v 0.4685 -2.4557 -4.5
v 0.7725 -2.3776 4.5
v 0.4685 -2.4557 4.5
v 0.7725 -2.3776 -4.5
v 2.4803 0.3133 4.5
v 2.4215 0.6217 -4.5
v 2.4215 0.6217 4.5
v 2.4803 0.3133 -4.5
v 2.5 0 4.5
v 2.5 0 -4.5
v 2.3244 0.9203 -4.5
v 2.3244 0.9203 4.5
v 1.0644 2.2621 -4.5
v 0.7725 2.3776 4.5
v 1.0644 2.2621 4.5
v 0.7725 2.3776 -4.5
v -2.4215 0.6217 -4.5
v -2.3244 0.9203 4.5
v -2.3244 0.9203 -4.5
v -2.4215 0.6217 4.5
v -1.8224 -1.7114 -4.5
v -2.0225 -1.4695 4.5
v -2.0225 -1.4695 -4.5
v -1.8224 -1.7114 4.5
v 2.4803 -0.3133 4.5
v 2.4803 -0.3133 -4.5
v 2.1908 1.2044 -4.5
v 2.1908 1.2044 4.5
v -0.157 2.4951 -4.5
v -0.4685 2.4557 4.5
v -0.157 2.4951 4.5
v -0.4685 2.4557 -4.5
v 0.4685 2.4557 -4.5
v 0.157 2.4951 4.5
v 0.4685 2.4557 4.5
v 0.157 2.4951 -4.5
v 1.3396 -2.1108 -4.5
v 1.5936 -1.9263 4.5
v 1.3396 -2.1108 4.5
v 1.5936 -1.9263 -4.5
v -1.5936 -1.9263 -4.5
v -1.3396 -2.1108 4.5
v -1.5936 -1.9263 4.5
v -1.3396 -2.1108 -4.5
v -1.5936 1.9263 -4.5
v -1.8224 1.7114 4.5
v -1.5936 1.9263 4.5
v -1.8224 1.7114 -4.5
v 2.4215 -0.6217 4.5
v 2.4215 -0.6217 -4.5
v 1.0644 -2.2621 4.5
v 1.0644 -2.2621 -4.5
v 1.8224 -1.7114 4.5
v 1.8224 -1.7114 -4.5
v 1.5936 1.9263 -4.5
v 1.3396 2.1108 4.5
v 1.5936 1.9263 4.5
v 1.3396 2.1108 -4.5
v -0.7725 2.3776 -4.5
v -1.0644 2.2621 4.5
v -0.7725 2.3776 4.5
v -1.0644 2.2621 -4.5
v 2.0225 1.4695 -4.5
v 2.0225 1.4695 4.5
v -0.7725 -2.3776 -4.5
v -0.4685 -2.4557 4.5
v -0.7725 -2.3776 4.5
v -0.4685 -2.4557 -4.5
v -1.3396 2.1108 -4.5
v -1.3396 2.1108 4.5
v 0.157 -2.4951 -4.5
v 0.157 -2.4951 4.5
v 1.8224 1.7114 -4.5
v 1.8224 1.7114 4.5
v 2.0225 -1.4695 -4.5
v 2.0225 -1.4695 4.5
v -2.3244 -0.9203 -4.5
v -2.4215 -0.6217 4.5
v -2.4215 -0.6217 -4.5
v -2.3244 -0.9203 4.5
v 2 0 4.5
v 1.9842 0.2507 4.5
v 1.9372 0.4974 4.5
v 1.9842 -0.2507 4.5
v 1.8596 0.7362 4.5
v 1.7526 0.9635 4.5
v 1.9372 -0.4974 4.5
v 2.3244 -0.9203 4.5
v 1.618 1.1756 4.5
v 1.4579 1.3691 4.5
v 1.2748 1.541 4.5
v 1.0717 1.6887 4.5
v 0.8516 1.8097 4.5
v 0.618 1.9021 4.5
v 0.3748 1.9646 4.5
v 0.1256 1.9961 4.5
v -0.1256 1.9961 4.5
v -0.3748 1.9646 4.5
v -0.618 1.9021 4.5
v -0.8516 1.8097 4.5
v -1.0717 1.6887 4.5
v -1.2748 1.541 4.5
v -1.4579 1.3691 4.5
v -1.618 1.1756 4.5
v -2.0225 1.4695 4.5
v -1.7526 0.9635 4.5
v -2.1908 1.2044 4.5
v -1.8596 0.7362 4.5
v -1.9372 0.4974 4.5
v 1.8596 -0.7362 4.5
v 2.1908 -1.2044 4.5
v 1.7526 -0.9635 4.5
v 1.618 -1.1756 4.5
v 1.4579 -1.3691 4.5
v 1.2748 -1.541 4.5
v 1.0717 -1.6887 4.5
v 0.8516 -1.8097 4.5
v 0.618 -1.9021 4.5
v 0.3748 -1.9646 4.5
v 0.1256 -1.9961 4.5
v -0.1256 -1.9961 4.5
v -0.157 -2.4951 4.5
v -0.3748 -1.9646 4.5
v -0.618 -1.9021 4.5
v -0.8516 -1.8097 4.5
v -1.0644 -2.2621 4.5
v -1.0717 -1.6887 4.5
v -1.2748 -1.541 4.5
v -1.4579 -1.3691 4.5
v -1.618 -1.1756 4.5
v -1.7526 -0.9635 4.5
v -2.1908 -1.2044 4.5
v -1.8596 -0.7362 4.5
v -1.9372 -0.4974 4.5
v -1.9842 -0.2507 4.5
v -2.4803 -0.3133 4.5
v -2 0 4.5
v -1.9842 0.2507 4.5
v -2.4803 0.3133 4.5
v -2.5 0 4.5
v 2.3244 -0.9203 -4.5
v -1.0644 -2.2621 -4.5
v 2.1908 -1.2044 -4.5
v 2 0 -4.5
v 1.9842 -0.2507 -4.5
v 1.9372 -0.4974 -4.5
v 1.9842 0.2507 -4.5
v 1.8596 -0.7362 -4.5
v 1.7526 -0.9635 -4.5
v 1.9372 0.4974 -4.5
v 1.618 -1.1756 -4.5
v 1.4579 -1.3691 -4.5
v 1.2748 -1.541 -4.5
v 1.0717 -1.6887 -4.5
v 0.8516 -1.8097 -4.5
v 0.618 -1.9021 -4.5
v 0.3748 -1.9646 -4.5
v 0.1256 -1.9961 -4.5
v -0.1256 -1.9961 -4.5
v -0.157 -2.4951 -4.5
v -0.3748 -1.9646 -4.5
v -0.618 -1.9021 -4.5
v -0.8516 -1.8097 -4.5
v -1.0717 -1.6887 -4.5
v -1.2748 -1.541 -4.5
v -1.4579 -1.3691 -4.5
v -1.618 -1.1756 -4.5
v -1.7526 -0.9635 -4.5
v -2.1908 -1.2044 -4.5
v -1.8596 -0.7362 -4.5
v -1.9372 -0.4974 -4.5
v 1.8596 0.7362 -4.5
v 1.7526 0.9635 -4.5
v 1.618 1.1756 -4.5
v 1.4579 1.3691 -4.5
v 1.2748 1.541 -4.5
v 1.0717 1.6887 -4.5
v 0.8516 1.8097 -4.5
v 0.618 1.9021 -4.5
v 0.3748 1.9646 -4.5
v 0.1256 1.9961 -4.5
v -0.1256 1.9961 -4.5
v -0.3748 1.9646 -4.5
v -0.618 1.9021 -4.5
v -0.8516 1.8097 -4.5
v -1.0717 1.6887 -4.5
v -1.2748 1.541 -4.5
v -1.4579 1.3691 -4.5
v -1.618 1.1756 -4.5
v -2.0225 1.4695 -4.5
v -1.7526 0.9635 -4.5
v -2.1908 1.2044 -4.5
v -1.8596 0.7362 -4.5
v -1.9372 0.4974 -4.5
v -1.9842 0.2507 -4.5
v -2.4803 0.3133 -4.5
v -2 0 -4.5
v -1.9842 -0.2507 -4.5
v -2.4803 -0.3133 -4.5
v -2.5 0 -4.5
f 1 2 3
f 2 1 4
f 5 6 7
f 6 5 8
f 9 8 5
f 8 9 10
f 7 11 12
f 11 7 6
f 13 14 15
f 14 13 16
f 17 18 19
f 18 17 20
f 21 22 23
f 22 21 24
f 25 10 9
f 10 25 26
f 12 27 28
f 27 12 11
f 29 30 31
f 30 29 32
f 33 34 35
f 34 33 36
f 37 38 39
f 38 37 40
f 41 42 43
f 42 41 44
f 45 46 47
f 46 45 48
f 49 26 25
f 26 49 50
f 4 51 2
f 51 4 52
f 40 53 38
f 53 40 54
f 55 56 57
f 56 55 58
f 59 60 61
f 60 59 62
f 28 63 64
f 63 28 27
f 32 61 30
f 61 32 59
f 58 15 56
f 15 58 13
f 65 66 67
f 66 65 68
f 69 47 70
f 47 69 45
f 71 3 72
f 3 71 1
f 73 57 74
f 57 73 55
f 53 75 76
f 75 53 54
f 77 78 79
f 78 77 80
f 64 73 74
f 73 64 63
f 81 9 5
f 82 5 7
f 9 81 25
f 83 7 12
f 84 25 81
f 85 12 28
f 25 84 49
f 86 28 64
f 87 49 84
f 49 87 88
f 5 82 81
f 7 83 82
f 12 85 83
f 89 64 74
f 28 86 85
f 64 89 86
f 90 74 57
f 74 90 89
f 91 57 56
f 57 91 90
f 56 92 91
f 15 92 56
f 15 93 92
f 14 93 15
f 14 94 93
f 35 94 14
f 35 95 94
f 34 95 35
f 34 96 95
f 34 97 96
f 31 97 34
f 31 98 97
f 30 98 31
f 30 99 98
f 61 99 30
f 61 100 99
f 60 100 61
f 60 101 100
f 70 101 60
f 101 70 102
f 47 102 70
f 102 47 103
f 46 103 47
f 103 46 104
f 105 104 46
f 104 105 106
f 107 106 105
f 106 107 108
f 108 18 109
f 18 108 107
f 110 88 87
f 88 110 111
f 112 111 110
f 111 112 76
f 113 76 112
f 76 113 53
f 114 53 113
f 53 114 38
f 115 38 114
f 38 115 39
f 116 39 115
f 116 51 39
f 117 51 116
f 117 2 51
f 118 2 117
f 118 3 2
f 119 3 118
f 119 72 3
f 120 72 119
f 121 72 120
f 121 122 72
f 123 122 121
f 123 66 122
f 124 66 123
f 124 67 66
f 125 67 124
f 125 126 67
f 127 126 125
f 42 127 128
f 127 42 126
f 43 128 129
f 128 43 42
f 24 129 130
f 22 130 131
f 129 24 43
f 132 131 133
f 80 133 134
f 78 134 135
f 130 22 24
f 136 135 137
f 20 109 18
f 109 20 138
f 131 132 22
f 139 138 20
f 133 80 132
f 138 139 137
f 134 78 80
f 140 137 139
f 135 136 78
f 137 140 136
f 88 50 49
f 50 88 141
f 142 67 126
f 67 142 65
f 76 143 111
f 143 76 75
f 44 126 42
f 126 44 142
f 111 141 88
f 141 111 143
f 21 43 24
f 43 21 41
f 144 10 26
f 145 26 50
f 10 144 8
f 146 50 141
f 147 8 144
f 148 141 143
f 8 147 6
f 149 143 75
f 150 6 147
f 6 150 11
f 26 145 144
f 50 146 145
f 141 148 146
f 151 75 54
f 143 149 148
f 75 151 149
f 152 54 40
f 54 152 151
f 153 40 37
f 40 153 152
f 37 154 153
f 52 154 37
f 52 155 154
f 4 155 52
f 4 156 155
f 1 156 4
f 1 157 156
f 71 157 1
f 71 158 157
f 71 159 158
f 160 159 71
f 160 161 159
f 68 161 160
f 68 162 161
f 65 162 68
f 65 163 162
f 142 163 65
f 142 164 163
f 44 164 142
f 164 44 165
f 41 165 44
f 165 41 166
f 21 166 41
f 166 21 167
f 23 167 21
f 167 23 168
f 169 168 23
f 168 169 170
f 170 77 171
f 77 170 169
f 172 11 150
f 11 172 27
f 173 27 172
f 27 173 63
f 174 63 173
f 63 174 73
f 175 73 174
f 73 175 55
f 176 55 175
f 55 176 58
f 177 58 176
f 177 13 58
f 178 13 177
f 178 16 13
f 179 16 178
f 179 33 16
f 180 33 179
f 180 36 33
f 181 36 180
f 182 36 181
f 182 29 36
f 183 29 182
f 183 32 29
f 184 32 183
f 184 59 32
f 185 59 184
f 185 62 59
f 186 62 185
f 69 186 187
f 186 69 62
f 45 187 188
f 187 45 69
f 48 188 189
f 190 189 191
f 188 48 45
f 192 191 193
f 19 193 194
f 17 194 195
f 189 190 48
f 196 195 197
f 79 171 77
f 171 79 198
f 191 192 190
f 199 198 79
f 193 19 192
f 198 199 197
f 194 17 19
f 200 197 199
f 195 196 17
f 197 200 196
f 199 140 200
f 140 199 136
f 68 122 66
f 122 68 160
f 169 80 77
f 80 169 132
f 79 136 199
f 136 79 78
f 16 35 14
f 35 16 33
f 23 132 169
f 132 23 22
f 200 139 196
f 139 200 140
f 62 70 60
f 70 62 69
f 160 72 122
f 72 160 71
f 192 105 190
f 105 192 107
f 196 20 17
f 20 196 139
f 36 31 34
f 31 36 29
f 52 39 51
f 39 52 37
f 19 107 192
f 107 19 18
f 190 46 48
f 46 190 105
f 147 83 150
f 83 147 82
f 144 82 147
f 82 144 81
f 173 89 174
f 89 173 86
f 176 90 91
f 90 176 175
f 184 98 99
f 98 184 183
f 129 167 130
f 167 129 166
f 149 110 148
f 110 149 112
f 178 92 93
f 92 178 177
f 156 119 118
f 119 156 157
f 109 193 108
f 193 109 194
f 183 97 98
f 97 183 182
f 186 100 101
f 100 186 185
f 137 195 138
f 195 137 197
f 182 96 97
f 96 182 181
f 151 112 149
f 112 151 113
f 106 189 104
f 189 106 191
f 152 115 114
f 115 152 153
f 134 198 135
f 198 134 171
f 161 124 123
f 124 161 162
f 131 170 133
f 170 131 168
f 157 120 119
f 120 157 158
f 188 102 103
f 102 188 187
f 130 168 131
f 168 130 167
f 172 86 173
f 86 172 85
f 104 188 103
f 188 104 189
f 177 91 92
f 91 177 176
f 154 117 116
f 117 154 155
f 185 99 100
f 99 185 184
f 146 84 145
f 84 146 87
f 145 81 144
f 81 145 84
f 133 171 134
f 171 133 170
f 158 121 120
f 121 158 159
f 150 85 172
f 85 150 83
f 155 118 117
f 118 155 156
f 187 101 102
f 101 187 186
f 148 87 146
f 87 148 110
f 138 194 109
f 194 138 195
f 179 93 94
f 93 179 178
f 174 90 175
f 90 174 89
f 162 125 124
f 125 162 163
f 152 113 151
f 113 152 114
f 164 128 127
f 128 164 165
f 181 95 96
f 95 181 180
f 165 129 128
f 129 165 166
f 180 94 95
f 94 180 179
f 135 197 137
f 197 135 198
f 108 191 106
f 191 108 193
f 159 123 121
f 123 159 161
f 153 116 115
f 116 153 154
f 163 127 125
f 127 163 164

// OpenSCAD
$fn = 50;


difference() {
	union() {
		translate(v = [0, 0, -4.5000000000]) {
			cylinder(h = 9, r = 2.5000000000);
		}
	}
	union() {
		translate(v = [0, 0, -100.0000000000]) {
			cylinder(h = 200, r = 2.0000000000);
		}
	}
}
